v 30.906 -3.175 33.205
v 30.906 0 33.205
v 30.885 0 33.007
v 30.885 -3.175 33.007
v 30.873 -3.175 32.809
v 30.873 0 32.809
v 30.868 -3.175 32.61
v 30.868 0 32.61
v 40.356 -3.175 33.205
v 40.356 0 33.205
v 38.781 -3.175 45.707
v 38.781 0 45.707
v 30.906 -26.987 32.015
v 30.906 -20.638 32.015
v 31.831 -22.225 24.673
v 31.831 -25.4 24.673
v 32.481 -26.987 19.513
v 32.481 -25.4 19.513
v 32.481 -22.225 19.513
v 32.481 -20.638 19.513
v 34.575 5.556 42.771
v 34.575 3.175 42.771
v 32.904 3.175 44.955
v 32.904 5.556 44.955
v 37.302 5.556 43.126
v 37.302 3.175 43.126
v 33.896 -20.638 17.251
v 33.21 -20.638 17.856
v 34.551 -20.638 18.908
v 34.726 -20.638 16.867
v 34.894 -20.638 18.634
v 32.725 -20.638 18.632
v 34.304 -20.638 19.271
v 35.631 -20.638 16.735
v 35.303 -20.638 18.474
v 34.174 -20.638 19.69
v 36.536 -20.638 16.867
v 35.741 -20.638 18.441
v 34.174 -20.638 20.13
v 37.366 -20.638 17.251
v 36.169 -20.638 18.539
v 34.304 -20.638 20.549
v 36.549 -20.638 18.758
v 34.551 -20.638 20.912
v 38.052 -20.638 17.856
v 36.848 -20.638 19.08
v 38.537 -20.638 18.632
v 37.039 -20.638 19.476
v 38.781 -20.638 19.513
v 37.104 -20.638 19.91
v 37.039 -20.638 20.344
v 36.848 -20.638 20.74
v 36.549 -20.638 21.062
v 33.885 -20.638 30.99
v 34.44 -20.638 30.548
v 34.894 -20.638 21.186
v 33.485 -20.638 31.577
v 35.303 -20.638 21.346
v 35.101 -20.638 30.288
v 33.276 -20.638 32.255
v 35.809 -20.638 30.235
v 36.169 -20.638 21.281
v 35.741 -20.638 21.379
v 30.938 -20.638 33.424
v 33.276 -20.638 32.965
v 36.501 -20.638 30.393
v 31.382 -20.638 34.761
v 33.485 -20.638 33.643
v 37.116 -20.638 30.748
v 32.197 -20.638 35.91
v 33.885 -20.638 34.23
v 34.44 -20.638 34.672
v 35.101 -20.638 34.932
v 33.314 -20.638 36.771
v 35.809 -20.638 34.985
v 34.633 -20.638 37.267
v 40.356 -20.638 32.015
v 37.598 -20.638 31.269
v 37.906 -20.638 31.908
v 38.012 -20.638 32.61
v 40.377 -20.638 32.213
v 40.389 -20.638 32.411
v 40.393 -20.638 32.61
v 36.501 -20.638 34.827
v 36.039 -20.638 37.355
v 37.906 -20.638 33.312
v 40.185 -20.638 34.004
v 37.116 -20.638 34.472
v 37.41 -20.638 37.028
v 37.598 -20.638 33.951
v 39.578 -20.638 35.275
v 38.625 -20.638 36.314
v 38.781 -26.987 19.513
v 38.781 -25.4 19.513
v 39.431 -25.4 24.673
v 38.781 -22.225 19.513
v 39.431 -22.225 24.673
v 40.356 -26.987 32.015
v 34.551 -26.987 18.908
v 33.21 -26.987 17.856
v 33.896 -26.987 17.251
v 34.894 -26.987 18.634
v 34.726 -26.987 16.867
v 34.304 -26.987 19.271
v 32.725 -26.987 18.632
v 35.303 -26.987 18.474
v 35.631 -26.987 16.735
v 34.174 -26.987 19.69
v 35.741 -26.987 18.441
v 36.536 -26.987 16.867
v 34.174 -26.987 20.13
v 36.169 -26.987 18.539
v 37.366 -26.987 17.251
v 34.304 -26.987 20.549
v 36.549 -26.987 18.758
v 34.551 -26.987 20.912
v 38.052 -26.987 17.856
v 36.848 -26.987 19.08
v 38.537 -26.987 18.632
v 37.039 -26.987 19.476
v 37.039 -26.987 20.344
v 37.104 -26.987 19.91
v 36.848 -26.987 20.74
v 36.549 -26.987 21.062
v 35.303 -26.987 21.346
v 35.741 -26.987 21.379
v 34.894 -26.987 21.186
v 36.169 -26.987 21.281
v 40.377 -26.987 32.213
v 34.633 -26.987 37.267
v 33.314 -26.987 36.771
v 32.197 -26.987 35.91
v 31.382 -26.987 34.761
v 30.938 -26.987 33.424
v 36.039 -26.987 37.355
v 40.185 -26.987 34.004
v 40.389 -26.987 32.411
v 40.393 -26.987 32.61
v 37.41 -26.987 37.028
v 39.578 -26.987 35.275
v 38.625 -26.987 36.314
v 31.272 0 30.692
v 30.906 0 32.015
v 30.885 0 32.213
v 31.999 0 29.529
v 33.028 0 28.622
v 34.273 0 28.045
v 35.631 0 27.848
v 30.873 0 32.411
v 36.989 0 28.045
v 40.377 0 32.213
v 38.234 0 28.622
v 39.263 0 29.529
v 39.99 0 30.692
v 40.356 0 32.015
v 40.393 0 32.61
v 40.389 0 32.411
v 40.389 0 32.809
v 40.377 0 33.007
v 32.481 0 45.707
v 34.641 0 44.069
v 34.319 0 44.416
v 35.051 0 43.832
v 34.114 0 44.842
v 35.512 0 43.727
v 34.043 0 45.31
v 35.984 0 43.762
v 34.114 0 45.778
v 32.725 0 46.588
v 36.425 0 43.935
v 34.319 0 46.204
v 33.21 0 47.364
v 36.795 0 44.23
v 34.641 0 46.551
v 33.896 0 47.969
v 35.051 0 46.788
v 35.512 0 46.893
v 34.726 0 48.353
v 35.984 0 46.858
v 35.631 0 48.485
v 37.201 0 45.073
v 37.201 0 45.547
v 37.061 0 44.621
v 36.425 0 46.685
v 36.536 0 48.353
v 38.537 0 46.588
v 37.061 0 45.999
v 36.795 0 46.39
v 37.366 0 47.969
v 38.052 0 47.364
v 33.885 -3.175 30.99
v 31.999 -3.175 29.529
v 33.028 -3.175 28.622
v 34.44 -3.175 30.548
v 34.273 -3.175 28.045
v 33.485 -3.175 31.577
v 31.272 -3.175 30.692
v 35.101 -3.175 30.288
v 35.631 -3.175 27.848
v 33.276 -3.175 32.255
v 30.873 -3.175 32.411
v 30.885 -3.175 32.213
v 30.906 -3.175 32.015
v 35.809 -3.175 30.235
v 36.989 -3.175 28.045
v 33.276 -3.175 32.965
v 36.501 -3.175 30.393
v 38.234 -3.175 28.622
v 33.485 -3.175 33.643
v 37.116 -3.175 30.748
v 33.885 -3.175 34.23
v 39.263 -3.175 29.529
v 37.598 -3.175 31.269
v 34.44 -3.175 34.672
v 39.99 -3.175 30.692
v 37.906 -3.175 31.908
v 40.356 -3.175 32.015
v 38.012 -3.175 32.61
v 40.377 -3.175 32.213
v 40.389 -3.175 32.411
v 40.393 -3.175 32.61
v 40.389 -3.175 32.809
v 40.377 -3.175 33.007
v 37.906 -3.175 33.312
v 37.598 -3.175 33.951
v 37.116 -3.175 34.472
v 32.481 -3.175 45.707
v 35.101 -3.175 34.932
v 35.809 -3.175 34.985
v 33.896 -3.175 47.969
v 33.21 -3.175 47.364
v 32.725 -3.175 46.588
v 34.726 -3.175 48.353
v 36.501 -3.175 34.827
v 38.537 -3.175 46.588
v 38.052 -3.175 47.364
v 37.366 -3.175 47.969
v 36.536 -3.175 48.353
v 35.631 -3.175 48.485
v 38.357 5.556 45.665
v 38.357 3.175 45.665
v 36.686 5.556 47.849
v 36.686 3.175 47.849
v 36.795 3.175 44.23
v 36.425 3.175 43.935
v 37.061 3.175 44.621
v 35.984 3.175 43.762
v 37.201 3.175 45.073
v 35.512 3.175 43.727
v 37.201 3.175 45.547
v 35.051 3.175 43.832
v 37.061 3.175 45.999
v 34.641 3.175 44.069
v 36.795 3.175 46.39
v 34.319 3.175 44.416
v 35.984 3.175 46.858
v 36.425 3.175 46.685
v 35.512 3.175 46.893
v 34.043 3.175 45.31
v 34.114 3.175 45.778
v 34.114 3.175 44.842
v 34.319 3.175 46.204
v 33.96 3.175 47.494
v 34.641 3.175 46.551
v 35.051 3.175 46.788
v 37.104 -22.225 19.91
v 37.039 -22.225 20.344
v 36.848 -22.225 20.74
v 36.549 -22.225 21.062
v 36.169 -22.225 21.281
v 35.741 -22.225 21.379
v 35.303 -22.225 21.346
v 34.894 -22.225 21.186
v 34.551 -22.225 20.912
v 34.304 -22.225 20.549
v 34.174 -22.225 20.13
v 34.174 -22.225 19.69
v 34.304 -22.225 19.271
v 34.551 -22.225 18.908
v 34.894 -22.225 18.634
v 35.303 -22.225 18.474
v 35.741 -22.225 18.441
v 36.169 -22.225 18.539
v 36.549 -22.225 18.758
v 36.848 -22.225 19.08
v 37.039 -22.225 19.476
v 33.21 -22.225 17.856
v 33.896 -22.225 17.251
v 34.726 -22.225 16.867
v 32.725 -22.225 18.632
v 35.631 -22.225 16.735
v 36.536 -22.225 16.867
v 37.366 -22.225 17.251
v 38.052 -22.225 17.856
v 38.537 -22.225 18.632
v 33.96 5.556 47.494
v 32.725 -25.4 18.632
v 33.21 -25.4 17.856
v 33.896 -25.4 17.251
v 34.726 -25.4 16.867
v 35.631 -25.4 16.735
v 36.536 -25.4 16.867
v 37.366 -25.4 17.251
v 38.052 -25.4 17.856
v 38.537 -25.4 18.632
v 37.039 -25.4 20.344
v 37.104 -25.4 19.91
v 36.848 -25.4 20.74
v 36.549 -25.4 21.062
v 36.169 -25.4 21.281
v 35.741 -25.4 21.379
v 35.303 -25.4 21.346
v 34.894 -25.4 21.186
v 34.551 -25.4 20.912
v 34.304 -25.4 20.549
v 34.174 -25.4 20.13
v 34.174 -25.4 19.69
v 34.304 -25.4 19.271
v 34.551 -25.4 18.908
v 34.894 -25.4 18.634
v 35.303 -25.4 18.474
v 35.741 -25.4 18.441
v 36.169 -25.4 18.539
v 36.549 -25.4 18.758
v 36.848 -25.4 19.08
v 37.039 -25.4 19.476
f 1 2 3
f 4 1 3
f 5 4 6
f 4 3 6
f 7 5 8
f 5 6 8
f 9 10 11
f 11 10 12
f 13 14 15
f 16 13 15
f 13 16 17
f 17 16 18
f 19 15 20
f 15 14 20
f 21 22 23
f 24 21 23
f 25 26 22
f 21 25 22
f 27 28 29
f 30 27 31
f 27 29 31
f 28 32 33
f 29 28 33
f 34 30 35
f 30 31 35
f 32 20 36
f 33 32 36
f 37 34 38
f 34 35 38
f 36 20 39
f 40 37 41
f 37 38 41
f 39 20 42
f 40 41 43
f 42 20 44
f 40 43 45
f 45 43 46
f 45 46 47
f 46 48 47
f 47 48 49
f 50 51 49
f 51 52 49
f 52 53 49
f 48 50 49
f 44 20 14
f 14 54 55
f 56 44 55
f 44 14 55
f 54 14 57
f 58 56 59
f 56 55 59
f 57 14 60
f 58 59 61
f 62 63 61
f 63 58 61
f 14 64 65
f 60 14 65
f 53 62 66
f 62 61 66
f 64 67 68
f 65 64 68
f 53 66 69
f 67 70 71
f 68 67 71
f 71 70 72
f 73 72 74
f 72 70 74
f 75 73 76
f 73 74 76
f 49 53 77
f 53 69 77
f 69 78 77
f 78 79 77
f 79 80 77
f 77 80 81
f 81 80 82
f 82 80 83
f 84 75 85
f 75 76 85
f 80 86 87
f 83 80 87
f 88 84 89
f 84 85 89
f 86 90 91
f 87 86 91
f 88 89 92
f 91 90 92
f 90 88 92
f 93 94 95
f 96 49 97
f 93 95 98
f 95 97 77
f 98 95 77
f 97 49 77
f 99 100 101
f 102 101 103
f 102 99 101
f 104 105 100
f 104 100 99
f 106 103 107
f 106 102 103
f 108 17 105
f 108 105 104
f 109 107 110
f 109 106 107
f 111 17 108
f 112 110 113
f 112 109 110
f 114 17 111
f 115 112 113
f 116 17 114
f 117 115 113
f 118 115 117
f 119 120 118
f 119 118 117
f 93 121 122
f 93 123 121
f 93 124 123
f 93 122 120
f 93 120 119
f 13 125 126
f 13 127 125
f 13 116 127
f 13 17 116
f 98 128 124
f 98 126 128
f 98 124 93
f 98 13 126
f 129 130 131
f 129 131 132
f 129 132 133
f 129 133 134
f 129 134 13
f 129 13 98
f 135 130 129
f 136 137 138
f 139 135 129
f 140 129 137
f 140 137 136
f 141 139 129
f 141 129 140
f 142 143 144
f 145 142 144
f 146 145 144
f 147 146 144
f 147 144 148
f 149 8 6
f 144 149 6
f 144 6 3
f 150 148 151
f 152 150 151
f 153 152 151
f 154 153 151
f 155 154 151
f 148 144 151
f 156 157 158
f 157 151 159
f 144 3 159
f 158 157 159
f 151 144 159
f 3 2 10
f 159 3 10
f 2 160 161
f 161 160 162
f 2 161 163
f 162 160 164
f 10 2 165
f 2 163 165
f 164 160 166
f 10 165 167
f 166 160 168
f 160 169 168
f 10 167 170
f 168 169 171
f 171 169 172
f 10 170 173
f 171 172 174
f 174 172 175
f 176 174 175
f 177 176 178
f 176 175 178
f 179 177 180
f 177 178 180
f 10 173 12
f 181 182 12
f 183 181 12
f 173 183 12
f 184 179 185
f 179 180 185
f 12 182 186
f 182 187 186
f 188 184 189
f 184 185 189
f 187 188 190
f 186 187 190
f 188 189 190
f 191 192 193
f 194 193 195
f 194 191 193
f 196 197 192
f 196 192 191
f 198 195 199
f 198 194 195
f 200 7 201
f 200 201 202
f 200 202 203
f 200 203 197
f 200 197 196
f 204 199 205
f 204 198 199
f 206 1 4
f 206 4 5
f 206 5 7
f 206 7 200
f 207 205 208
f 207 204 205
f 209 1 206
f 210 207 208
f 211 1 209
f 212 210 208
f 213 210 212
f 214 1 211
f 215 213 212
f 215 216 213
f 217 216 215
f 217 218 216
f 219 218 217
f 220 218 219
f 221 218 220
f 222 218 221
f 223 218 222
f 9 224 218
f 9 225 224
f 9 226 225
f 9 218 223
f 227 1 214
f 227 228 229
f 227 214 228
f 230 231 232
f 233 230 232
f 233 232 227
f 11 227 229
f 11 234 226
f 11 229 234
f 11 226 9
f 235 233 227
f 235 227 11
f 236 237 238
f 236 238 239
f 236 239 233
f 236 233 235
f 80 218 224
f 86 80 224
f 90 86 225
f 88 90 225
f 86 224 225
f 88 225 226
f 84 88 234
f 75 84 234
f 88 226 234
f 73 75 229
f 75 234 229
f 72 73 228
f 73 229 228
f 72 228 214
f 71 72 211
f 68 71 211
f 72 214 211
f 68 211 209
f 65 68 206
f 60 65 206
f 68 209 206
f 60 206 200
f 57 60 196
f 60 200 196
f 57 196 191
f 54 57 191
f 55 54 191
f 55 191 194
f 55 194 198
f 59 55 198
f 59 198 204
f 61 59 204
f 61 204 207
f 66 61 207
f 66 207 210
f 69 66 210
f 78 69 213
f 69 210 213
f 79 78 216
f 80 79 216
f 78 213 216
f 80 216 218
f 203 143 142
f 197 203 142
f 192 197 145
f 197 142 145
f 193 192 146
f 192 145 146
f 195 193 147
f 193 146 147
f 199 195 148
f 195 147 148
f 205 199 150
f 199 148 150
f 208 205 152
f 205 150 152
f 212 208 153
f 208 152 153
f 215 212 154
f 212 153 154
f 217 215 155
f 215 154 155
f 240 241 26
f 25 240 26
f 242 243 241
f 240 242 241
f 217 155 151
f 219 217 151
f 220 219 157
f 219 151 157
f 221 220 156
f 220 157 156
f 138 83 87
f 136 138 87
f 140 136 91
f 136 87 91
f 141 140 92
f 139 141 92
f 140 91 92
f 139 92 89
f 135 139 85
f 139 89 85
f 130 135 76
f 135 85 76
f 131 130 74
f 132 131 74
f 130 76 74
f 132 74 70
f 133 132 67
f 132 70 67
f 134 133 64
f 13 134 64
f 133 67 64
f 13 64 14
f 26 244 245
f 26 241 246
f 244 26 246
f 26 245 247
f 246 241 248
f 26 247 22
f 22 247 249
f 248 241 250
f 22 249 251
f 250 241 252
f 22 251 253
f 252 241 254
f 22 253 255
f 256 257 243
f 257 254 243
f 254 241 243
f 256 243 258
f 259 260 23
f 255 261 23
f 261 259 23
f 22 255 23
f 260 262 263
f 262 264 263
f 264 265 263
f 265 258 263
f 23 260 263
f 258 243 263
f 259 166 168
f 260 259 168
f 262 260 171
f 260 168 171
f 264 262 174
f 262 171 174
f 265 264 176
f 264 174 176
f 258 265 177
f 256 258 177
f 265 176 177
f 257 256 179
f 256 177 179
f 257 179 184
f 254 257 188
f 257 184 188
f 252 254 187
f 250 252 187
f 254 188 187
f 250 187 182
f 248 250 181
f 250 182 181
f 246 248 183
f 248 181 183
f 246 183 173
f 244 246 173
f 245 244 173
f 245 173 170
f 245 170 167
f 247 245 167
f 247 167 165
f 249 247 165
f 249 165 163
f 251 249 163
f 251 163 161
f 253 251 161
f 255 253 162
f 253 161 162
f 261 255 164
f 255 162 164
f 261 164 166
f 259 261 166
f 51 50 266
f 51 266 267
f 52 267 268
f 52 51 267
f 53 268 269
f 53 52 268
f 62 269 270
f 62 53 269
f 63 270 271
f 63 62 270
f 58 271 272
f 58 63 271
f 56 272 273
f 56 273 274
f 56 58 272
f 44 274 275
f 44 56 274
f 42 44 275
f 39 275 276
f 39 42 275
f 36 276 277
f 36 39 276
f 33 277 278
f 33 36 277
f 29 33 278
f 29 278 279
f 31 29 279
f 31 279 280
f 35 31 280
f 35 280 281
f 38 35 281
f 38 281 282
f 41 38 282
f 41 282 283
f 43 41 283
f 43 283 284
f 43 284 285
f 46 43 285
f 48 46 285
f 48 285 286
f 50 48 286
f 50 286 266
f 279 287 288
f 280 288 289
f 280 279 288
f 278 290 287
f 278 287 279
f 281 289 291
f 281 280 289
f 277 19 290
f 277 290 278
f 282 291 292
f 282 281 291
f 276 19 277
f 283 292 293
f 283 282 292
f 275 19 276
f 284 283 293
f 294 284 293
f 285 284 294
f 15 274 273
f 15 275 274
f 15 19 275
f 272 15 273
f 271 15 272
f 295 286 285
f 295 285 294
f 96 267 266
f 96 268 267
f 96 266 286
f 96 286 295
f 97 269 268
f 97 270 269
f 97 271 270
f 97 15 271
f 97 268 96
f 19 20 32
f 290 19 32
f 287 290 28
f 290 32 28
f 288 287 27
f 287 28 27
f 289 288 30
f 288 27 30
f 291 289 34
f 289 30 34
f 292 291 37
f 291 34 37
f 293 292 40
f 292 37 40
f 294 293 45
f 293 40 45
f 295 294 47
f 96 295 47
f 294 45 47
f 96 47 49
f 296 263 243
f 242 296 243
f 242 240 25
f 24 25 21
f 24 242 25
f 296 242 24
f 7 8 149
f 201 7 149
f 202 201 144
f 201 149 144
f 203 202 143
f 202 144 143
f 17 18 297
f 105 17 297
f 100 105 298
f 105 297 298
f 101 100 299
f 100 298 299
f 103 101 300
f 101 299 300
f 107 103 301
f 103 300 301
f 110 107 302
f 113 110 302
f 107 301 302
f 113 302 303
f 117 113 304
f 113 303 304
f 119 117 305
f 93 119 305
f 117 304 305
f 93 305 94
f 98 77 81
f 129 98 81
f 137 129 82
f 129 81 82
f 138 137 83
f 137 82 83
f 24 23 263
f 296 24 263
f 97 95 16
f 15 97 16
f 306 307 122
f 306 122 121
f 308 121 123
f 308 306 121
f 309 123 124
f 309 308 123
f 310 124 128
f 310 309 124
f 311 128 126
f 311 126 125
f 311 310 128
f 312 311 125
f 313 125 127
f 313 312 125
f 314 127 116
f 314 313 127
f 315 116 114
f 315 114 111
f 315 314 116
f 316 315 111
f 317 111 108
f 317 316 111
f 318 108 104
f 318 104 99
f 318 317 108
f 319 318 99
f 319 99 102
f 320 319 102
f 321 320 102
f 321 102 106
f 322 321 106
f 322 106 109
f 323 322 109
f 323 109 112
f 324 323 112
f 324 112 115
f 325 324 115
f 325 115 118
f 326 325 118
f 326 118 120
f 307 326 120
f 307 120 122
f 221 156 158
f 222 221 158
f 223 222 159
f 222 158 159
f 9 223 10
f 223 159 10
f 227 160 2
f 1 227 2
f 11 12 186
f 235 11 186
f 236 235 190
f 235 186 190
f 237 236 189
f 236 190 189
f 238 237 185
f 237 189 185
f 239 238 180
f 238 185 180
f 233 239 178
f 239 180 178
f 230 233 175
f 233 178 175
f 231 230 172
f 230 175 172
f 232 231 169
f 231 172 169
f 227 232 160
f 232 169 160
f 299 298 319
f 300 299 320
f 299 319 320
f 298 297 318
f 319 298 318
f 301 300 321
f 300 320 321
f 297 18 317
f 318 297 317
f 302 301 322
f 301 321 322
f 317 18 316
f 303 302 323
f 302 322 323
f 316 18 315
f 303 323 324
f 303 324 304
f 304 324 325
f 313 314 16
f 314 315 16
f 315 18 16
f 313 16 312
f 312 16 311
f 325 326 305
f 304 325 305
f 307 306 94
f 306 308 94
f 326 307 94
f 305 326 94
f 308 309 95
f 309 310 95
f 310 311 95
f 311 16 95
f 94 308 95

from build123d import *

# Parameters (mm, degrees)
F0_R      = 1.4732
F1_DEPTH  = 3.175
F2_R      = 1.5875
F3_DEPTH  = 3.175
F5_DEPTH  = 2.38125
F6_R      = 2.38125
F7_DEPTH  = 17.4625
F8_R      = 1.4732
F9_DEPTH  = 6.35
F11_R     = 1.4732
F12_DEPTH = 1.5875


with BuildPart() as f1:
    # F0 (on Front) → F1 (new body)
    with BuildSketch(Plane.XZ):
        with BuildLine():
            ThreePointArc((30.9057507299, 33.2053364545), (30.8777447649, 32.9082655755), (30.868397212, 32.6100239545))
            ThreePointArc((30.868397212, 32.6100239545), (30.8777447649, 32.3117823335), (30.9057507299, 32.0147114545))
            ThreePointArc((30.9057507299, 32.0147114545), (35.630897212, 27.8475239545), (40.3560436941, 32.0147114545))
            ThreePointArc((40.3560436941, 32.0147114545), (40.3840496591, 32.3117823335), (40.393397212, 32.6100239545))
            ThreePointArc((40.393397212, 32.6100239545), (40.3840496591, 32.9082655755), (40.3560436941, 33.2053364545))
            ThreePointArc((40.3560436941, 33.2053364545), (35.630897212, 37.3725239545), (30.9057507299, 33.2053364545))
        make_face()
        with BuildLine():
            Line((32.4807995573, 45.7068989545), (30.9057507299, 33.2053364545))
            ThreePointArc((30.9057507299, 33.2053364545), (35.630897212, 37.3725239545), (40.3560436941, 33.2053364545))
            Line((40.3560436941, 33.2053364545), (38.7809948668, 45.7068989545))
            ThreePointArc((38.7809948668, 45.7068989545), (38.7996655101, 45.5088517018), (38.805897212, 45.3100239545))
            ThreePointArc((38.805897212, 45.3100239545), (35.4320694647, 42.1412556564), (32.4807995573, 45.7068989545))
        make_face()
        with BuildLine():
            ThreePointArc((38.7809948668, 45.7068989545), (35.630897212, 48.4850239545), (32.4807995573, 45.7068989545))
            ThreePointArc((32.4807995573, 45.7068989545), (35.4320694647, 42.1412556564), (38.805897212, 45.3100239545))
            ThreePointArc((38.805897212, 45.3100239545), (38.7996655101, 45.5088517018), (38.7809948668, 45.7068989545))
        make_face()
        with Locations((35.630897212, 45.3100239545)):
            Circle(F0_R, mode=Mode.SUBTRACT)
        with Locations((35.630897212, 45.3100239545)):
            Circle(F0_R)
    extrude(amount=F1_DEPTH)

    # F2 (on face) → F3 (join)
    with BuildSketch(Plane(origin=(0, 0, 0), x_dir=(-1, 0, 0), z_dir=(0, 1, 0))):
        with Locations((-35.630897212, 45.3100239545)):
            Circle(F2_R)
    extrude(amount=F3_DEPTH)

    # F4 (on face) → F5 (join)
    with BuildSketch(Plane(origin=(0, 3.175, 0), x_dir=(-1, 0, 0), z_dir=(0, 1, 0))):
        Polygon((-34.5753285935, 42.7710785747), (-32.904321705, 44.9547005036), (-33.9598903235, 47.4936458835), (-36.6864658305, 47.8489693343), (-38.357472719, 45.6653474054), (-37.3019041005, 43.1264020256), align=None)
    extrude(amount=F5_DEPTH)

    # F6 (on face) → F7 (join)
    with BuildSketch(Plane.XZ.offset(3.175)):
        with Locations((35.630897212, 32.6100239545)):
            Circle(F6_R)
    extrude(amount=F7_DEPTH)

    # F8 (on face) → F9 (join)
    with BuildSketch(Plane.XZ.offset(20.6375)):
        with BuildLine():
            ThreePointArc((40.3560436941, 32.0147114545), (40.3840496591, 32.3117823335), (40.393397212, 32.6100239545))
            ThreePointArc((40.393397212, 32.6100239545), (35.332655591, 37.3631764016), (30.9057507299, 32.0147114545))
            ThreePointArc((30.9057507299, 32.0147114545), (35.630897212, 27.8475239545), (40.3560436941, 32.0147114545))
        make_face()
        with BuildLine():
            ThreePointArc((40.3560436941, 32.0147114545), (35.630897212, 27.8475239545), (30.9057507299, 32.0147114545))
            Line((30.9057507299, 32.0147114545), (32.4807995573, 19.5131489545))
            ThreePointArc((32.4807995573, 19.5131489545), (35.4320694647, 23.0787922526), (38.805897212, 19.9100239545))
            ThreePointArc((38.805897212, 19.9100239545), (38.7996655101, 19.7111962072), (38.7809948668, 19.5131489545))
            Line((38.7809948668, 19.5131489545), (40.3560436941, 32.0147114545))
        make_face()
        with BuildLine():
            ThreePointArc((38.805897212, 19.9100239545), (35.4320694647, 23.0787922526), (32.4807995573, 19.5131489545))
            ThreePointArc((32.4807995573, 19.5131489545), (35.630897212, 16.7350239545), (38.7809948668, 19.5131489545))
            ThreePointArc((38.7809948668, 19.5131489545), (38.7996655101, 19.7111962072), (38.805897212, 19.9100239545))
        make_face()
        with Locations((35.630897212, 19.9100239545)):
            Circle(F8_R, mode=Mode.SUBTRACT)
    extrude(amount=F9_DEPTH)

    # F11 (on offset) → F12 (cut, symmetric)
    with BuildSketch(Plane.XZ.offset(23.8125)):
        with BuildLine():
            Line((38.7809948668, 19.5131489545), (39.4310150177, 24.6725239545))
            Line((39.4310150177, 24.6725239545), (31.8307794063, 24.6725239545))
            Line((31.8307794063, 24.6725239545), (32.4807995573, 19.5131489545))
            ThreePointArc((32.4807995573, 19.5131489545), (35.630897212, 16.7350239545), (38.7809948668, 19.5131489545))
        make_face()
        with Locations((35.630897212, 19.9100239545)):
            Circle(F11_R, mode=Mode.SUBTRACT)
    extrude(amount=F12_DEPTH, both=True, mode=Mode.SUBTRACT)


solid = f1.part
